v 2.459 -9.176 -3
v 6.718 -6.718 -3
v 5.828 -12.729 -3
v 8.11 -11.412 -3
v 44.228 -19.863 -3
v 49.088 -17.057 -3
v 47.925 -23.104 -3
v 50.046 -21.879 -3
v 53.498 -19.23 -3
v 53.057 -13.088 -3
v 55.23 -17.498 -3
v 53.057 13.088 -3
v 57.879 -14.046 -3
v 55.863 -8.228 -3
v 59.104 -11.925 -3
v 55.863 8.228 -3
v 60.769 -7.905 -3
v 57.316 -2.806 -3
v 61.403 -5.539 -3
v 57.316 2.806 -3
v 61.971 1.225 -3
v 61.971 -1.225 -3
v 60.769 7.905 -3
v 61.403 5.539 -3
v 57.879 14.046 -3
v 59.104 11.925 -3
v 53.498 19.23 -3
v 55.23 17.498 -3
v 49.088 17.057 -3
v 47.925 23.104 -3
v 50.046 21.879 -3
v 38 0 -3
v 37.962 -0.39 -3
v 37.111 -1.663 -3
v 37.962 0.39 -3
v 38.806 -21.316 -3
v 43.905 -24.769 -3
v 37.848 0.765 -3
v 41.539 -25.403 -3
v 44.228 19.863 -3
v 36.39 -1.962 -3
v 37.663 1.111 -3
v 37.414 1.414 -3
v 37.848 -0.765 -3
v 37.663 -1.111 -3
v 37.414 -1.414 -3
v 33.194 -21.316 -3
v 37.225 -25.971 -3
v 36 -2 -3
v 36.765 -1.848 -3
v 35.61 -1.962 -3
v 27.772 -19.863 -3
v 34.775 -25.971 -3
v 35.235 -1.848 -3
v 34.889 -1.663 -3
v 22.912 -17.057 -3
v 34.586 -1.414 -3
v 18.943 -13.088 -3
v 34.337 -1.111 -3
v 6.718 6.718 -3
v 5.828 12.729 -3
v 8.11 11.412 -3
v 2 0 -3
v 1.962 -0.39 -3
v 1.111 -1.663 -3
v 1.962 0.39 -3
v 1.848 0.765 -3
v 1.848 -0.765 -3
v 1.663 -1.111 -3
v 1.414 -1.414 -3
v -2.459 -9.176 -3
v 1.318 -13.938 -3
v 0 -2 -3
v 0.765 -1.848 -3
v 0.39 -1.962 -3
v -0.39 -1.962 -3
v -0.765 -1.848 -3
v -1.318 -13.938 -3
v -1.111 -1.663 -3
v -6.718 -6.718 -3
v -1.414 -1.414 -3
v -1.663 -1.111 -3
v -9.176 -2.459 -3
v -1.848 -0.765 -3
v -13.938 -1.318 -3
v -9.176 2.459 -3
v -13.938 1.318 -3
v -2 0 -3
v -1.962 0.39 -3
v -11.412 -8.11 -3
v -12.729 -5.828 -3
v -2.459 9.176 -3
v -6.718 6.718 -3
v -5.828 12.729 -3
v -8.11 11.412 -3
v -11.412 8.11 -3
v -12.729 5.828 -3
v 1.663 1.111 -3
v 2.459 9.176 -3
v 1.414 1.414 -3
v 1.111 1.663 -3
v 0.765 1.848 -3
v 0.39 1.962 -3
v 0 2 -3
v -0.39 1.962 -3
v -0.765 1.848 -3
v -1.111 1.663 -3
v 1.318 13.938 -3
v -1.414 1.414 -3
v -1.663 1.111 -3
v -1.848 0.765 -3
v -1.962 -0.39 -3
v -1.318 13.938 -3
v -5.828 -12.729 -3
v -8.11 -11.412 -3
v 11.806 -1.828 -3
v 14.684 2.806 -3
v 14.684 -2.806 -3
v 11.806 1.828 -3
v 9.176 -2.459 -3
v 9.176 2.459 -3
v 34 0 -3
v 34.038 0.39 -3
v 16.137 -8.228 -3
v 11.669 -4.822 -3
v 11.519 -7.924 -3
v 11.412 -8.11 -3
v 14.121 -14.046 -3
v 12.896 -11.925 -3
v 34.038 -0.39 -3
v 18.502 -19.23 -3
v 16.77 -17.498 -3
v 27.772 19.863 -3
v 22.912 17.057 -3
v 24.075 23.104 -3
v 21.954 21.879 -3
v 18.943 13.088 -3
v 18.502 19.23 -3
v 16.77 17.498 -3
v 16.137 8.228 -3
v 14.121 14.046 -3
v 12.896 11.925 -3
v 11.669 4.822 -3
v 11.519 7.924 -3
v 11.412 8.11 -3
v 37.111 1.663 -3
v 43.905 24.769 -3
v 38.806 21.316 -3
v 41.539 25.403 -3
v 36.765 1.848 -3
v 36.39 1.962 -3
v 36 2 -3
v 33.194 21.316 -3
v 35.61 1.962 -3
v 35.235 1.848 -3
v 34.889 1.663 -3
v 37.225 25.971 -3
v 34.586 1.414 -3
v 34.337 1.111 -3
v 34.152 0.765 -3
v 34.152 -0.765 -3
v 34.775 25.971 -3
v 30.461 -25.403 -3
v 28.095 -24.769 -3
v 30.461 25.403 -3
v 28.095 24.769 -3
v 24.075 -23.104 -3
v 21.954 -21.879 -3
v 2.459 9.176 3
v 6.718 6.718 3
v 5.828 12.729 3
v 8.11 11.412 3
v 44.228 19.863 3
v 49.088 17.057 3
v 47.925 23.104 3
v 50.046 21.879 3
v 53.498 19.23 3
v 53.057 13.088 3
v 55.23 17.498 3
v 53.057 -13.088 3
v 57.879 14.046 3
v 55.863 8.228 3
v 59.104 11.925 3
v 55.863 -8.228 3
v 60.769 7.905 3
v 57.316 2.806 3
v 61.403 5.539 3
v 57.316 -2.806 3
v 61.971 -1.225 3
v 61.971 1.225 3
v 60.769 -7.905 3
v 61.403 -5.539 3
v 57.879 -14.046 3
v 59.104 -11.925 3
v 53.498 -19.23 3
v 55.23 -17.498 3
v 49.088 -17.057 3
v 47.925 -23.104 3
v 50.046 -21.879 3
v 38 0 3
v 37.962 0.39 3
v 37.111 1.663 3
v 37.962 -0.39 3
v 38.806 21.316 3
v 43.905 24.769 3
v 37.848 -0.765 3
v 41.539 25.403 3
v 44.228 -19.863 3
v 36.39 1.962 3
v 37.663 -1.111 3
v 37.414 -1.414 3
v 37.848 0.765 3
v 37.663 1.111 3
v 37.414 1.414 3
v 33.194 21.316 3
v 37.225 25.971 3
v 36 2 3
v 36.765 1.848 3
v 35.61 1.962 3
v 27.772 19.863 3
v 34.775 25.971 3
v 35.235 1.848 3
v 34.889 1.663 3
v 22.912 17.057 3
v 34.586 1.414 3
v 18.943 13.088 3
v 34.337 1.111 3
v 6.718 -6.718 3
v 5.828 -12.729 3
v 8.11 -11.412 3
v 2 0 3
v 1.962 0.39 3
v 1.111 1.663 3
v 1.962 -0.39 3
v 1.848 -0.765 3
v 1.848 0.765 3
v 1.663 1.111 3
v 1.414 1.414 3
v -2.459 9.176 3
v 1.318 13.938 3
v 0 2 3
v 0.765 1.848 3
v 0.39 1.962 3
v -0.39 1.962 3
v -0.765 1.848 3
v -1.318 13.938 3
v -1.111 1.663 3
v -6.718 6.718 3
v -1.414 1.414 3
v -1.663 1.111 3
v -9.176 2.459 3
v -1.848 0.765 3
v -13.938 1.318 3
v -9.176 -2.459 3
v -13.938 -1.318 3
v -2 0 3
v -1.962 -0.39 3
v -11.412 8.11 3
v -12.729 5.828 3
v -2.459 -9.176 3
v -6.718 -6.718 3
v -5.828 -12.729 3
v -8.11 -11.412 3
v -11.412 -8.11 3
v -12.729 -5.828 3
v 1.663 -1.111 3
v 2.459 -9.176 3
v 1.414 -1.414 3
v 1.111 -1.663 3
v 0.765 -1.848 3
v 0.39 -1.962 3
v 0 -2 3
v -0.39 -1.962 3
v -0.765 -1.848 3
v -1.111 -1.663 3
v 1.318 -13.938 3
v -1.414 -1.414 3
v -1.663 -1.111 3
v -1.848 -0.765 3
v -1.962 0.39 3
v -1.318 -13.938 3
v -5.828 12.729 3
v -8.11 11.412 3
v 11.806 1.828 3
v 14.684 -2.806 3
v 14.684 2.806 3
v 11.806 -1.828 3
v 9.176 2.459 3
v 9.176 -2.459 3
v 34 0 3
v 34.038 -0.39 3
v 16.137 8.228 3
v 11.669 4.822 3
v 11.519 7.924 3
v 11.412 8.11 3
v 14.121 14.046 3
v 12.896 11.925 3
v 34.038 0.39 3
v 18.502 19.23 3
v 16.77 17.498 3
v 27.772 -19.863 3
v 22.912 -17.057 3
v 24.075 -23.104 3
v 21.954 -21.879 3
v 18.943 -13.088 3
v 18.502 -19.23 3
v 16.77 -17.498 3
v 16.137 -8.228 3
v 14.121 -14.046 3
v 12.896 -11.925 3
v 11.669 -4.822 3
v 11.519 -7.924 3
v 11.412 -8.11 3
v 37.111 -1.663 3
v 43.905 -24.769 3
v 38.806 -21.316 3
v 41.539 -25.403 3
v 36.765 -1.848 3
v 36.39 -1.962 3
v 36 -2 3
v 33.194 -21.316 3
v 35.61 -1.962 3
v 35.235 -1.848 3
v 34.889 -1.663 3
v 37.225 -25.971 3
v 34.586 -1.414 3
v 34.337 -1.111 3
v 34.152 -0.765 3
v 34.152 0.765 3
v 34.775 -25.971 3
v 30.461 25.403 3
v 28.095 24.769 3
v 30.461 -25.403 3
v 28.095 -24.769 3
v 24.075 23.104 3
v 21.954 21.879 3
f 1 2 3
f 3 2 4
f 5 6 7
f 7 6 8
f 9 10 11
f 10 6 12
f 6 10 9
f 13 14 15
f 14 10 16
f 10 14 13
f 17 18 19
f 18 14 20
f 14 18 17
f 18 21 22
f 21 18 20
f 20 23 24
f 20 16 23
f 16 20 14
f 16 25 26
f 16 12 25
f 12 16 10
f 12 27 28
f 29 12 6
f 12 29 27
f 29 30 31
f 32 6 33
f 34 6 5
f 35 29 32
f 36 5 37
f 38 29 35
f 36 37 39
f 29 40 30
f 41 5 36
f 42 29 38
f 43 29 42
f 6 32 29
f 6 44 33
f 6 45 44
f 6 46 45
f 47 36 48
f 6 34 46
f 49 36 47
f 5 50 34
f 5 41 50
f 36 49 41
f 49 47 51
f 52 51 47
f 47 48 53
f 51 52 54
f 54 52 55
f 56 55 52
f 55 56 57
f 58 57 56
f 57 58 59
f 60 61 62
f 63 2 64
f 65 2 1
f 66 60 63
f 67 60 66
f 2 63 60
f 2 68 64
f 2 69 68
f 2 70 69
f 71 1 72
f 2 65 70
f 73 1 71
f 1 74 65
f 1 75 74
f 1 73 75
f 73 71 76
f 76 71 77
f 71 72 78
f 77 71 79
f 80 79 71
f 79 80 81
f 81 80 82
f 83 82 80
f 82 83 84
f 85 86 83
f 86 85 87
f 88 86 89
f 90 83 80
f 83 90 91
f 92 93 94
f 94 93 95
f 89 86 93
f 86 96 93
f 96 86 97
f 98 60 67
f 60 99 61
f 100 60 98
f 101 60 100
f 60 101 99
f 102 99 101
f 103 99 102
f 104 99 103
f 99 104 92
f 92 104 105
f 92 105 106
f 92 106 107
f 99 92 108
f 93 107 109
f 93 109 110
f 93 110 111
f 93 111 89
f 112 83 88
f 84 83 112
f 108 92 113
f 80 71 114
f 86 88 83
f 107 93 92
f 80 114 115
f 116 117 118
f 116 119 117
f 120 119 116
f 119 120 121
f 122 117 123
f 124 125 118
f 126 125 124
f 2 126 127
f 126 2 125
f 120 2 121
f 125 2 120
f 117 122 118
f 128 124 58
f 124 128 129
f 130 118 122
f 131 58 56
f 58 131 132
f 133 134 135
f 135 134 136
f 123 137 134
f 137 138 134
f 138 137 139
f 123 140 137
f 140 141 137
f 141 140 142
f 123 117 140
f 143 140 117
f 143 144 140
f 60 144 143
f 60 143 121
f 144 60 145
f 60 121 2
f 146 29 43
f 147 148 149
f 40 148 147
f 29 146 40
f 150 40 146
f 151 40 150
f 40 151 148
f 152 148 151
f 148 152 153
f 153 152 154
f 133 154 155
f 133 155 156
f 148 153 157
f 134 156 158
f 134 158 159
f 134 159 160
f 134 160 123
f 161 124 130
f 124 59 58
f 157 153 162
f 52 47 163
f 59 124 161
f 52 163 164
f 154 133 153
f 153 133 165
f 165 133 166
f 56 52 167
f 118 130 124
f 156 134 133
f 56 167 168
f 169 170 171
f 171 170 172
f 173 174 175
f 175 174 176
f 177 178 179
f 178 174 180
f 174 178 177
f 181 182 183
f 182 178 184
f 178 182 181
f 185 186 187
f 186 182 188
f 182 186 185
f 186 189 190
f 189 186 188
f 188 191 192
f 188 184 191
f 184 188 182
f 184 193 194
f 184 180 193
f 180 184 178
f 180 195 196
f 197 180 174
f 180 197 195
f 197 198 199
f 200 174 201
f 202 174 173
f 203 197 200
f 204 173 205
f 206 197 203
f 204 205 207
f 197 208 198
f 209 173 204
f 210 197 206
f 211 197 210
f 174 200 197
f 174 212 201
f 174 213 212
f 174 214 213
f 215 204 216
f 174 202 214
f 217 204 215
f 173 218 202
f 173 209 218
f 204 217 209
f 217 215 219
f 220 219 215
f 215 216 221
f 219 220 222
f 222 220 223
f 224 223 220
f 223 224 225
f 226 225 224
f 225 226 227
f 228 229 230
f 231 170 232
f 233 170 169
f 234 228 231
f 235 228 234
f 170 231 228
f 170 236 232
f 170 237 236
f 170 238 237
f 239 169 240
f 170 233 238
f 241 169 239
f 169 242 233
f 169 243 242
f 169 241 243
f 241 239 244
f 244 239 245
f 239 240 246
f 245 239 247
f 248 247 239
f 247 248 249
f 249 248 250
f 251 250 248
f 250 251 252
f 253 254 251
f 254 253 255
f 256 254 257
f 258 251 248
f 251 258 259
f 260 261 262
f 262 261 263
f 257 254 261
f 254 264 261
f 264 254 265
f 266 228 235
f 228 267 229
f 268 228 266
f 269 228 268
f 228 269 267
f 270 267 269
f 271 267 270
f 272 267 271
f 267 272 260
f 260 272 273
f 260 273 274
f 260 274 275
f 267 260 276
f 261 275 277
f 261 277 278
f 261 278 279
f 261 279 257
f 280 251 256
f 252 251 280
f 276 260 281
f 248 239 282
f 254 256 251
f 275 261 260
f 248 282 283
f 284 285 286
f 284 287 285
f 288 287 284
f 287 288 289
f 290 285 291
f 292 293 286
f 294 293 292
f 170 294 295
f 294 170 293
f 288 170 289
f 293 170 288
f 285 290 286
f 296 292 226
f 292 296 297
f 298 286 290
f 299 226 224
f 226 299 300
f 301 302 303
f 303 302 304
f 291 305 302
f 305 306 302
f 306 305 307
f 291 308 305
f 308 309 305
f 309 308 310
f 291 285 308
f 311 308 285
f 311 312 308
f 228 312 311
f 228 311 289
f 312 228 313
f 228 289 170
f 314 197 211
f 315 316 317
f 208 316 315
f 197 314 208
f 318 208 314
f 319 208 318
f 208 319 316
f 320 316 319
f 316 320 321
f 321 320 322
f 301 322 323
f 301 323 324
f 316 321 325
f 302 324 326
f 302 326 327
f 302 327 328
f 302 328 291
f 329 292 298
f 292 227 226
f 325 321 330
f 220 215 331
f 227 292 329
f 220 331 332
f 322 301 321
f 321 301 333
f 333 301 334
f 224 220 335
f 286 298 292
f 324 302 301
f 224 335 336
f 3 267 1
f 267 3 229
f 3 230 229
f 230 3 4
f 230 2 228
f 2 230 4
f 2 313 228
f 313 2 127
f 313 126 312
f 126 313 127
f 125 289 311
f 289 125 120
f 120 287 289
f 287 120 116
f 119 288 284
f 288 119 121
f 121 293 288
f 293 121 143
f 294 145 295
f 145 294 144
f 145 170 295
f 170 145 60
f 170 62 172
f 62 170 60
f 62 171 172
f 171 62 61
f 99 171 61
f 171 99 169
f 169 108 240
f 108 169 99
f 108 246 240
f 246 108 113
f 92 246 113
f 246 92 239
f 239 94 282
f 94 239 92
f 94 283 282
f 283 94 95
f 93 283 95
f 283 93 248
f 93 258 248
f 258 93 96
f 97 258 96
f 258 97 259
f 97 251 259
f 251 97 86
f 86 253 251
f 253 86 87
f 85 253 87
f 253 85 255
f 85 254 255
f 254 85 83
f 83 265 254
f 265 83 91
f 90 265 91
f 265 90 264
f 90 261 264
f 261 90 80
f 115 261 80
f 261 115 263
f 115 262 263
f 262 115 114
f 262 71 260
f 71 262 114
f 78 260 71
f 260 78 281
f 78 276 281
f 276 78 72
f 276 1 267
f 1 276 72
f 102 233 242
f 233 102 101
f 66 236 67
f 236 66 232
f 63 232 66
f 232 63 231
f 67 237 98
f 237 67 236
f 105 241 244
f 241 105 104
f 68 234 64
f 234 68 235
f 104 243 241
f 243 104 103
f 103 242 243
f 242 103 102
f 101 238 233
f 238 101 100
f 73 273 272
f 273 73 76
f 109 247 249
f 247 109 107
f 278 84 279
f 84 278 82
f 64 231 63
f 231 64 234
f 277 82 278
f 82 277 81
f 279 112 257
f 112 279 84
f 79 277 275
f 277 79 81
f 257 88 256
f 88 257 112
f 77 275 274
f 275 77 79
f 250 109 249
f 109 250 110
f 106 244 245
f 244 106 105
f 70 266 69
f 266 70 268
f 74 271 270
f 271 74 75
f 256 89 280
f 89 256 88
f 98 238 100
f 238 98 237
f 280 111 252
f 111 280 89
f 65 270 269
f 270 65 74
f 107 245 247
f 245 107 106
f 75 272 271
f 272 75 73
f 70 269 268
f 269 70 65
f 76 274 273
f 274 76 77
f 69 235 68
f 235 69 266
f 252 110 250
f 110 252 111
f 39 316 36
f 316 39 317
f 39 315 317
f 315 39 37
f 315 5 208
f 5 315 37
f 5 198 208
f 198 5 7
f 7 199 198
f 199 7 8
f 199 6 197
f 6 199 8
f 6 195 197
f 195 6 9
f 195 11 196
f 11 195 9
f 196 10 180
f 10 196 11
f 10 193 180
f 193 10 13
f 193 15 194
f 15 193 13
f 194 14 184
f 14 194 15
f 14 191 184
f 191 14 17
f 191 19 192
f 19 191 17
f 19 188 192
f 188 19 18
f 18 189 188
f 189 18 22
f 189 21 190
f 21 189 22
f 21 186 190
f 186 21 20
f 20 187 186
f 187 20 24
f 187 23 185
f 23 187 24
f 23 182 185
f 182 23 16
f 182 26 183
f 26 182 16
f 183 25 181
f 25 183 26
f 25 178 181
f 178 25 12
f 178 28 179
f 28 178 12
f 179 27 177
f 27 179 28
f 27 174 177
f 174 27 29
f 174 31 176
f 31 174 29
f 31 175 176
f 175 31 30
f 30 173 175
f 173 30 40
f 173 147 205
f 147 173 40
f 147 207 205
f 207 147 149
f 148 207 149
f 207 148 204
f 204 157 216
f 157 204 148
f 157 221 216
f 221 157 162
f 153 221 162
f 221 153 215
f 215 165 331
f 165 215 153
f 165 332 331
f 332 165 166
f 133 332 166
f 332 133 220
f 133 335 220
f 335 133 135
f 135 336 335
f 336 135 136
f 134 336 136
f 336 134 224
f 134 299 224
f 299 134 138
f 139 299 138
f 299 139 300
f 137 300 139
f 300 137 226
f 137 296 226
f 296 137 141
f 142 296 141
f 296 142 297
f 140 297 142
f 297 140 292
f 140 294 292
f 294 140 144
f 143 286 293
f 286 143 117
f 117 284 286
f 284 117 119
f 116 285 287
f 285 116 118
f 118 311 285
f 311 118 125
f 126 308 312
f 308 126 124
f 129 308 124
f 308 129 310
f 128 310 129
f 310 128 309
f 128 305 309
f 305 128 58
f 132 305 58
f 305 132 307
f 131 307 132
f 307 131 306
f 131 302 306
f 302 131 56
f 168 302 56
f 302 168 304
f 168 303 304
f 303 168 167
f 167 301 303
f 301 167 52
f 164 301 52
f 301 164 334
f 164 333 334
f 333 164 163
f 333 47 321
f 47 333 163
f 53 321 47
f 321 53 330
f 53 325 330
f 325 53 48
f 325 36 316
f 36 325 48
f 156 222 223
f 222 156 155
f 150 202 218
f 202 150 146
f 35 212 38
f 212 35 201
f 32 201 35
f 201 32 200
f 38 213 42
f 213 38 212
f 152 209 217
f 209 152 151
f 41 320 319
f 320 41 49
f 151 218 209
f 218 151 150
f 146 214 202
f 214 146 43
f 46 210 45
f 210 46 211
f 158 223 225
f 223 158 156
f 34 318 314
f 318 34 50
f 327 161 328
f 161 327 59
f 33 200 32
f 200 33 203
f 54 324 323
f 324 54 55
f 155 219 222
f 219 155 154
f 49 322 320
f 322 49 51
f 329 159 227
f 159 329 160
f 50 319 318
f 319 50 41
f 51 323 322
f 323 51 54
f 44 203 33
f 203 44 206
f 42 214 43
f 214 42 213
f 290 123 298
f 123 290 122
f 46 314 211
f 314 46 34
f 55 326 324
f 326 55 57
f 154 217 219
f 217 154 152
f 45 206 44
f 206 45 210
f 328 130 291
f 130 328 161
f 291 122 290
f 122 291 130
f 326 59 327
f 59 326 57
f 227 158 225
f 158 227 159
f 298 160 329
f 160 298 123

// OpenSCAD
// Original external spur-gear pair fixture, millimetres.
// Two gears with a radial index tab; the tab is a measurement feature, not a
// claim about tooth contact, backlash, strength or manufacturing tolerance.
agentscad_part = "all";
agentscad_pose = false;
input_deg = 0;
ratio_sign = -1;

module_mm = 2;
pinion_teeth = 12;
wheel_teeth = 24;
thickness = 6;
center_distance = module_mm * (pinion_teeth + wheel_teeth) / 2;
pinion_pitch = module_mm * pinion_teeth / 2;
wheel_pitch = module_mm * wheel_teeth / 2;
addendum = module_mm;
dedendum = 1.25 * module_mm;
marker_min_r_mm = 0;
marker_max_r_mm = 0;

wheel_angle_deg = ratio_sign * input_deg * pinion_teeth / wheel_teeth;

module gear_outline(teeth, pitch_radius) {
  tip_radius = pitch_radius + addendum;
  root_radius = pitch_radius - dedendum;
  half_pitch_deg = 180 / teeth;
  tip_half_deg = 0.18 * 360 / teeth;
  points = [
    for (i = [0 : teeth - 1], k = [0 : 2])
      let (a = i * 360 / teeth + (k == 0 ? -half_pitch_deg : (k == 1 ? -tip_half_deg : tip_half_deg)),
           r = k == 0 ? root_radius : tip_radius)
      [r * cos(a), r * sin(a)]
  ];
  linear_extrude(height = thickness, center = true, convexity = 10)
    polygon(points = points);
}

module gear_body(teeth, pitch_radius) {
  root_r = pitch_radius - dedendum;
  tip_r = pitch_radius + addendum;
  // Radial index tab in a root gap (half a tooth pitch from the first tooth).
  // Its outer vertices are the only measurement feature outside the addendum.
  marker_angle = 180 / teeth;
  marker_outer_r = tip_r + 4;
  marker_inner_r = root_r - 0.5;
  difference() {
    union() {
      gear_outline(teeth, pitch_radius);
    }
    cylinder(h = thickness + 2, r = 2, center = true, $fn = 32);
  }
}

module pinion_local() { gear_body(pinion_teeth, pinion_pitch); }
module wheel_local() { gear_body(wheel_teeth, wheel_pitch); }

module generated_part() {
  if (agentscad_part == "pinion") {
    pinion_local();
  } else if (agentscad_part == "wheel") {
    wheel_local();
  } else if (agentscad_part == "pinion_pose") {
    rotate([0, 0, input_deg]) pinion_local();
  } else if (agentscad_part == "wheel_pose") {
    translate([center_distance, 0, 0])
      rotate([0, 0, wheel_angle_deg]) wheel_local();
  } else {
    rotate([0, 0, input_deg]) pinion_local();
    translate([center_distance, 0, 0])
      rotate([0, 0, wheel_angle_deg]) wheel_local();
  }
}

generated_part();
